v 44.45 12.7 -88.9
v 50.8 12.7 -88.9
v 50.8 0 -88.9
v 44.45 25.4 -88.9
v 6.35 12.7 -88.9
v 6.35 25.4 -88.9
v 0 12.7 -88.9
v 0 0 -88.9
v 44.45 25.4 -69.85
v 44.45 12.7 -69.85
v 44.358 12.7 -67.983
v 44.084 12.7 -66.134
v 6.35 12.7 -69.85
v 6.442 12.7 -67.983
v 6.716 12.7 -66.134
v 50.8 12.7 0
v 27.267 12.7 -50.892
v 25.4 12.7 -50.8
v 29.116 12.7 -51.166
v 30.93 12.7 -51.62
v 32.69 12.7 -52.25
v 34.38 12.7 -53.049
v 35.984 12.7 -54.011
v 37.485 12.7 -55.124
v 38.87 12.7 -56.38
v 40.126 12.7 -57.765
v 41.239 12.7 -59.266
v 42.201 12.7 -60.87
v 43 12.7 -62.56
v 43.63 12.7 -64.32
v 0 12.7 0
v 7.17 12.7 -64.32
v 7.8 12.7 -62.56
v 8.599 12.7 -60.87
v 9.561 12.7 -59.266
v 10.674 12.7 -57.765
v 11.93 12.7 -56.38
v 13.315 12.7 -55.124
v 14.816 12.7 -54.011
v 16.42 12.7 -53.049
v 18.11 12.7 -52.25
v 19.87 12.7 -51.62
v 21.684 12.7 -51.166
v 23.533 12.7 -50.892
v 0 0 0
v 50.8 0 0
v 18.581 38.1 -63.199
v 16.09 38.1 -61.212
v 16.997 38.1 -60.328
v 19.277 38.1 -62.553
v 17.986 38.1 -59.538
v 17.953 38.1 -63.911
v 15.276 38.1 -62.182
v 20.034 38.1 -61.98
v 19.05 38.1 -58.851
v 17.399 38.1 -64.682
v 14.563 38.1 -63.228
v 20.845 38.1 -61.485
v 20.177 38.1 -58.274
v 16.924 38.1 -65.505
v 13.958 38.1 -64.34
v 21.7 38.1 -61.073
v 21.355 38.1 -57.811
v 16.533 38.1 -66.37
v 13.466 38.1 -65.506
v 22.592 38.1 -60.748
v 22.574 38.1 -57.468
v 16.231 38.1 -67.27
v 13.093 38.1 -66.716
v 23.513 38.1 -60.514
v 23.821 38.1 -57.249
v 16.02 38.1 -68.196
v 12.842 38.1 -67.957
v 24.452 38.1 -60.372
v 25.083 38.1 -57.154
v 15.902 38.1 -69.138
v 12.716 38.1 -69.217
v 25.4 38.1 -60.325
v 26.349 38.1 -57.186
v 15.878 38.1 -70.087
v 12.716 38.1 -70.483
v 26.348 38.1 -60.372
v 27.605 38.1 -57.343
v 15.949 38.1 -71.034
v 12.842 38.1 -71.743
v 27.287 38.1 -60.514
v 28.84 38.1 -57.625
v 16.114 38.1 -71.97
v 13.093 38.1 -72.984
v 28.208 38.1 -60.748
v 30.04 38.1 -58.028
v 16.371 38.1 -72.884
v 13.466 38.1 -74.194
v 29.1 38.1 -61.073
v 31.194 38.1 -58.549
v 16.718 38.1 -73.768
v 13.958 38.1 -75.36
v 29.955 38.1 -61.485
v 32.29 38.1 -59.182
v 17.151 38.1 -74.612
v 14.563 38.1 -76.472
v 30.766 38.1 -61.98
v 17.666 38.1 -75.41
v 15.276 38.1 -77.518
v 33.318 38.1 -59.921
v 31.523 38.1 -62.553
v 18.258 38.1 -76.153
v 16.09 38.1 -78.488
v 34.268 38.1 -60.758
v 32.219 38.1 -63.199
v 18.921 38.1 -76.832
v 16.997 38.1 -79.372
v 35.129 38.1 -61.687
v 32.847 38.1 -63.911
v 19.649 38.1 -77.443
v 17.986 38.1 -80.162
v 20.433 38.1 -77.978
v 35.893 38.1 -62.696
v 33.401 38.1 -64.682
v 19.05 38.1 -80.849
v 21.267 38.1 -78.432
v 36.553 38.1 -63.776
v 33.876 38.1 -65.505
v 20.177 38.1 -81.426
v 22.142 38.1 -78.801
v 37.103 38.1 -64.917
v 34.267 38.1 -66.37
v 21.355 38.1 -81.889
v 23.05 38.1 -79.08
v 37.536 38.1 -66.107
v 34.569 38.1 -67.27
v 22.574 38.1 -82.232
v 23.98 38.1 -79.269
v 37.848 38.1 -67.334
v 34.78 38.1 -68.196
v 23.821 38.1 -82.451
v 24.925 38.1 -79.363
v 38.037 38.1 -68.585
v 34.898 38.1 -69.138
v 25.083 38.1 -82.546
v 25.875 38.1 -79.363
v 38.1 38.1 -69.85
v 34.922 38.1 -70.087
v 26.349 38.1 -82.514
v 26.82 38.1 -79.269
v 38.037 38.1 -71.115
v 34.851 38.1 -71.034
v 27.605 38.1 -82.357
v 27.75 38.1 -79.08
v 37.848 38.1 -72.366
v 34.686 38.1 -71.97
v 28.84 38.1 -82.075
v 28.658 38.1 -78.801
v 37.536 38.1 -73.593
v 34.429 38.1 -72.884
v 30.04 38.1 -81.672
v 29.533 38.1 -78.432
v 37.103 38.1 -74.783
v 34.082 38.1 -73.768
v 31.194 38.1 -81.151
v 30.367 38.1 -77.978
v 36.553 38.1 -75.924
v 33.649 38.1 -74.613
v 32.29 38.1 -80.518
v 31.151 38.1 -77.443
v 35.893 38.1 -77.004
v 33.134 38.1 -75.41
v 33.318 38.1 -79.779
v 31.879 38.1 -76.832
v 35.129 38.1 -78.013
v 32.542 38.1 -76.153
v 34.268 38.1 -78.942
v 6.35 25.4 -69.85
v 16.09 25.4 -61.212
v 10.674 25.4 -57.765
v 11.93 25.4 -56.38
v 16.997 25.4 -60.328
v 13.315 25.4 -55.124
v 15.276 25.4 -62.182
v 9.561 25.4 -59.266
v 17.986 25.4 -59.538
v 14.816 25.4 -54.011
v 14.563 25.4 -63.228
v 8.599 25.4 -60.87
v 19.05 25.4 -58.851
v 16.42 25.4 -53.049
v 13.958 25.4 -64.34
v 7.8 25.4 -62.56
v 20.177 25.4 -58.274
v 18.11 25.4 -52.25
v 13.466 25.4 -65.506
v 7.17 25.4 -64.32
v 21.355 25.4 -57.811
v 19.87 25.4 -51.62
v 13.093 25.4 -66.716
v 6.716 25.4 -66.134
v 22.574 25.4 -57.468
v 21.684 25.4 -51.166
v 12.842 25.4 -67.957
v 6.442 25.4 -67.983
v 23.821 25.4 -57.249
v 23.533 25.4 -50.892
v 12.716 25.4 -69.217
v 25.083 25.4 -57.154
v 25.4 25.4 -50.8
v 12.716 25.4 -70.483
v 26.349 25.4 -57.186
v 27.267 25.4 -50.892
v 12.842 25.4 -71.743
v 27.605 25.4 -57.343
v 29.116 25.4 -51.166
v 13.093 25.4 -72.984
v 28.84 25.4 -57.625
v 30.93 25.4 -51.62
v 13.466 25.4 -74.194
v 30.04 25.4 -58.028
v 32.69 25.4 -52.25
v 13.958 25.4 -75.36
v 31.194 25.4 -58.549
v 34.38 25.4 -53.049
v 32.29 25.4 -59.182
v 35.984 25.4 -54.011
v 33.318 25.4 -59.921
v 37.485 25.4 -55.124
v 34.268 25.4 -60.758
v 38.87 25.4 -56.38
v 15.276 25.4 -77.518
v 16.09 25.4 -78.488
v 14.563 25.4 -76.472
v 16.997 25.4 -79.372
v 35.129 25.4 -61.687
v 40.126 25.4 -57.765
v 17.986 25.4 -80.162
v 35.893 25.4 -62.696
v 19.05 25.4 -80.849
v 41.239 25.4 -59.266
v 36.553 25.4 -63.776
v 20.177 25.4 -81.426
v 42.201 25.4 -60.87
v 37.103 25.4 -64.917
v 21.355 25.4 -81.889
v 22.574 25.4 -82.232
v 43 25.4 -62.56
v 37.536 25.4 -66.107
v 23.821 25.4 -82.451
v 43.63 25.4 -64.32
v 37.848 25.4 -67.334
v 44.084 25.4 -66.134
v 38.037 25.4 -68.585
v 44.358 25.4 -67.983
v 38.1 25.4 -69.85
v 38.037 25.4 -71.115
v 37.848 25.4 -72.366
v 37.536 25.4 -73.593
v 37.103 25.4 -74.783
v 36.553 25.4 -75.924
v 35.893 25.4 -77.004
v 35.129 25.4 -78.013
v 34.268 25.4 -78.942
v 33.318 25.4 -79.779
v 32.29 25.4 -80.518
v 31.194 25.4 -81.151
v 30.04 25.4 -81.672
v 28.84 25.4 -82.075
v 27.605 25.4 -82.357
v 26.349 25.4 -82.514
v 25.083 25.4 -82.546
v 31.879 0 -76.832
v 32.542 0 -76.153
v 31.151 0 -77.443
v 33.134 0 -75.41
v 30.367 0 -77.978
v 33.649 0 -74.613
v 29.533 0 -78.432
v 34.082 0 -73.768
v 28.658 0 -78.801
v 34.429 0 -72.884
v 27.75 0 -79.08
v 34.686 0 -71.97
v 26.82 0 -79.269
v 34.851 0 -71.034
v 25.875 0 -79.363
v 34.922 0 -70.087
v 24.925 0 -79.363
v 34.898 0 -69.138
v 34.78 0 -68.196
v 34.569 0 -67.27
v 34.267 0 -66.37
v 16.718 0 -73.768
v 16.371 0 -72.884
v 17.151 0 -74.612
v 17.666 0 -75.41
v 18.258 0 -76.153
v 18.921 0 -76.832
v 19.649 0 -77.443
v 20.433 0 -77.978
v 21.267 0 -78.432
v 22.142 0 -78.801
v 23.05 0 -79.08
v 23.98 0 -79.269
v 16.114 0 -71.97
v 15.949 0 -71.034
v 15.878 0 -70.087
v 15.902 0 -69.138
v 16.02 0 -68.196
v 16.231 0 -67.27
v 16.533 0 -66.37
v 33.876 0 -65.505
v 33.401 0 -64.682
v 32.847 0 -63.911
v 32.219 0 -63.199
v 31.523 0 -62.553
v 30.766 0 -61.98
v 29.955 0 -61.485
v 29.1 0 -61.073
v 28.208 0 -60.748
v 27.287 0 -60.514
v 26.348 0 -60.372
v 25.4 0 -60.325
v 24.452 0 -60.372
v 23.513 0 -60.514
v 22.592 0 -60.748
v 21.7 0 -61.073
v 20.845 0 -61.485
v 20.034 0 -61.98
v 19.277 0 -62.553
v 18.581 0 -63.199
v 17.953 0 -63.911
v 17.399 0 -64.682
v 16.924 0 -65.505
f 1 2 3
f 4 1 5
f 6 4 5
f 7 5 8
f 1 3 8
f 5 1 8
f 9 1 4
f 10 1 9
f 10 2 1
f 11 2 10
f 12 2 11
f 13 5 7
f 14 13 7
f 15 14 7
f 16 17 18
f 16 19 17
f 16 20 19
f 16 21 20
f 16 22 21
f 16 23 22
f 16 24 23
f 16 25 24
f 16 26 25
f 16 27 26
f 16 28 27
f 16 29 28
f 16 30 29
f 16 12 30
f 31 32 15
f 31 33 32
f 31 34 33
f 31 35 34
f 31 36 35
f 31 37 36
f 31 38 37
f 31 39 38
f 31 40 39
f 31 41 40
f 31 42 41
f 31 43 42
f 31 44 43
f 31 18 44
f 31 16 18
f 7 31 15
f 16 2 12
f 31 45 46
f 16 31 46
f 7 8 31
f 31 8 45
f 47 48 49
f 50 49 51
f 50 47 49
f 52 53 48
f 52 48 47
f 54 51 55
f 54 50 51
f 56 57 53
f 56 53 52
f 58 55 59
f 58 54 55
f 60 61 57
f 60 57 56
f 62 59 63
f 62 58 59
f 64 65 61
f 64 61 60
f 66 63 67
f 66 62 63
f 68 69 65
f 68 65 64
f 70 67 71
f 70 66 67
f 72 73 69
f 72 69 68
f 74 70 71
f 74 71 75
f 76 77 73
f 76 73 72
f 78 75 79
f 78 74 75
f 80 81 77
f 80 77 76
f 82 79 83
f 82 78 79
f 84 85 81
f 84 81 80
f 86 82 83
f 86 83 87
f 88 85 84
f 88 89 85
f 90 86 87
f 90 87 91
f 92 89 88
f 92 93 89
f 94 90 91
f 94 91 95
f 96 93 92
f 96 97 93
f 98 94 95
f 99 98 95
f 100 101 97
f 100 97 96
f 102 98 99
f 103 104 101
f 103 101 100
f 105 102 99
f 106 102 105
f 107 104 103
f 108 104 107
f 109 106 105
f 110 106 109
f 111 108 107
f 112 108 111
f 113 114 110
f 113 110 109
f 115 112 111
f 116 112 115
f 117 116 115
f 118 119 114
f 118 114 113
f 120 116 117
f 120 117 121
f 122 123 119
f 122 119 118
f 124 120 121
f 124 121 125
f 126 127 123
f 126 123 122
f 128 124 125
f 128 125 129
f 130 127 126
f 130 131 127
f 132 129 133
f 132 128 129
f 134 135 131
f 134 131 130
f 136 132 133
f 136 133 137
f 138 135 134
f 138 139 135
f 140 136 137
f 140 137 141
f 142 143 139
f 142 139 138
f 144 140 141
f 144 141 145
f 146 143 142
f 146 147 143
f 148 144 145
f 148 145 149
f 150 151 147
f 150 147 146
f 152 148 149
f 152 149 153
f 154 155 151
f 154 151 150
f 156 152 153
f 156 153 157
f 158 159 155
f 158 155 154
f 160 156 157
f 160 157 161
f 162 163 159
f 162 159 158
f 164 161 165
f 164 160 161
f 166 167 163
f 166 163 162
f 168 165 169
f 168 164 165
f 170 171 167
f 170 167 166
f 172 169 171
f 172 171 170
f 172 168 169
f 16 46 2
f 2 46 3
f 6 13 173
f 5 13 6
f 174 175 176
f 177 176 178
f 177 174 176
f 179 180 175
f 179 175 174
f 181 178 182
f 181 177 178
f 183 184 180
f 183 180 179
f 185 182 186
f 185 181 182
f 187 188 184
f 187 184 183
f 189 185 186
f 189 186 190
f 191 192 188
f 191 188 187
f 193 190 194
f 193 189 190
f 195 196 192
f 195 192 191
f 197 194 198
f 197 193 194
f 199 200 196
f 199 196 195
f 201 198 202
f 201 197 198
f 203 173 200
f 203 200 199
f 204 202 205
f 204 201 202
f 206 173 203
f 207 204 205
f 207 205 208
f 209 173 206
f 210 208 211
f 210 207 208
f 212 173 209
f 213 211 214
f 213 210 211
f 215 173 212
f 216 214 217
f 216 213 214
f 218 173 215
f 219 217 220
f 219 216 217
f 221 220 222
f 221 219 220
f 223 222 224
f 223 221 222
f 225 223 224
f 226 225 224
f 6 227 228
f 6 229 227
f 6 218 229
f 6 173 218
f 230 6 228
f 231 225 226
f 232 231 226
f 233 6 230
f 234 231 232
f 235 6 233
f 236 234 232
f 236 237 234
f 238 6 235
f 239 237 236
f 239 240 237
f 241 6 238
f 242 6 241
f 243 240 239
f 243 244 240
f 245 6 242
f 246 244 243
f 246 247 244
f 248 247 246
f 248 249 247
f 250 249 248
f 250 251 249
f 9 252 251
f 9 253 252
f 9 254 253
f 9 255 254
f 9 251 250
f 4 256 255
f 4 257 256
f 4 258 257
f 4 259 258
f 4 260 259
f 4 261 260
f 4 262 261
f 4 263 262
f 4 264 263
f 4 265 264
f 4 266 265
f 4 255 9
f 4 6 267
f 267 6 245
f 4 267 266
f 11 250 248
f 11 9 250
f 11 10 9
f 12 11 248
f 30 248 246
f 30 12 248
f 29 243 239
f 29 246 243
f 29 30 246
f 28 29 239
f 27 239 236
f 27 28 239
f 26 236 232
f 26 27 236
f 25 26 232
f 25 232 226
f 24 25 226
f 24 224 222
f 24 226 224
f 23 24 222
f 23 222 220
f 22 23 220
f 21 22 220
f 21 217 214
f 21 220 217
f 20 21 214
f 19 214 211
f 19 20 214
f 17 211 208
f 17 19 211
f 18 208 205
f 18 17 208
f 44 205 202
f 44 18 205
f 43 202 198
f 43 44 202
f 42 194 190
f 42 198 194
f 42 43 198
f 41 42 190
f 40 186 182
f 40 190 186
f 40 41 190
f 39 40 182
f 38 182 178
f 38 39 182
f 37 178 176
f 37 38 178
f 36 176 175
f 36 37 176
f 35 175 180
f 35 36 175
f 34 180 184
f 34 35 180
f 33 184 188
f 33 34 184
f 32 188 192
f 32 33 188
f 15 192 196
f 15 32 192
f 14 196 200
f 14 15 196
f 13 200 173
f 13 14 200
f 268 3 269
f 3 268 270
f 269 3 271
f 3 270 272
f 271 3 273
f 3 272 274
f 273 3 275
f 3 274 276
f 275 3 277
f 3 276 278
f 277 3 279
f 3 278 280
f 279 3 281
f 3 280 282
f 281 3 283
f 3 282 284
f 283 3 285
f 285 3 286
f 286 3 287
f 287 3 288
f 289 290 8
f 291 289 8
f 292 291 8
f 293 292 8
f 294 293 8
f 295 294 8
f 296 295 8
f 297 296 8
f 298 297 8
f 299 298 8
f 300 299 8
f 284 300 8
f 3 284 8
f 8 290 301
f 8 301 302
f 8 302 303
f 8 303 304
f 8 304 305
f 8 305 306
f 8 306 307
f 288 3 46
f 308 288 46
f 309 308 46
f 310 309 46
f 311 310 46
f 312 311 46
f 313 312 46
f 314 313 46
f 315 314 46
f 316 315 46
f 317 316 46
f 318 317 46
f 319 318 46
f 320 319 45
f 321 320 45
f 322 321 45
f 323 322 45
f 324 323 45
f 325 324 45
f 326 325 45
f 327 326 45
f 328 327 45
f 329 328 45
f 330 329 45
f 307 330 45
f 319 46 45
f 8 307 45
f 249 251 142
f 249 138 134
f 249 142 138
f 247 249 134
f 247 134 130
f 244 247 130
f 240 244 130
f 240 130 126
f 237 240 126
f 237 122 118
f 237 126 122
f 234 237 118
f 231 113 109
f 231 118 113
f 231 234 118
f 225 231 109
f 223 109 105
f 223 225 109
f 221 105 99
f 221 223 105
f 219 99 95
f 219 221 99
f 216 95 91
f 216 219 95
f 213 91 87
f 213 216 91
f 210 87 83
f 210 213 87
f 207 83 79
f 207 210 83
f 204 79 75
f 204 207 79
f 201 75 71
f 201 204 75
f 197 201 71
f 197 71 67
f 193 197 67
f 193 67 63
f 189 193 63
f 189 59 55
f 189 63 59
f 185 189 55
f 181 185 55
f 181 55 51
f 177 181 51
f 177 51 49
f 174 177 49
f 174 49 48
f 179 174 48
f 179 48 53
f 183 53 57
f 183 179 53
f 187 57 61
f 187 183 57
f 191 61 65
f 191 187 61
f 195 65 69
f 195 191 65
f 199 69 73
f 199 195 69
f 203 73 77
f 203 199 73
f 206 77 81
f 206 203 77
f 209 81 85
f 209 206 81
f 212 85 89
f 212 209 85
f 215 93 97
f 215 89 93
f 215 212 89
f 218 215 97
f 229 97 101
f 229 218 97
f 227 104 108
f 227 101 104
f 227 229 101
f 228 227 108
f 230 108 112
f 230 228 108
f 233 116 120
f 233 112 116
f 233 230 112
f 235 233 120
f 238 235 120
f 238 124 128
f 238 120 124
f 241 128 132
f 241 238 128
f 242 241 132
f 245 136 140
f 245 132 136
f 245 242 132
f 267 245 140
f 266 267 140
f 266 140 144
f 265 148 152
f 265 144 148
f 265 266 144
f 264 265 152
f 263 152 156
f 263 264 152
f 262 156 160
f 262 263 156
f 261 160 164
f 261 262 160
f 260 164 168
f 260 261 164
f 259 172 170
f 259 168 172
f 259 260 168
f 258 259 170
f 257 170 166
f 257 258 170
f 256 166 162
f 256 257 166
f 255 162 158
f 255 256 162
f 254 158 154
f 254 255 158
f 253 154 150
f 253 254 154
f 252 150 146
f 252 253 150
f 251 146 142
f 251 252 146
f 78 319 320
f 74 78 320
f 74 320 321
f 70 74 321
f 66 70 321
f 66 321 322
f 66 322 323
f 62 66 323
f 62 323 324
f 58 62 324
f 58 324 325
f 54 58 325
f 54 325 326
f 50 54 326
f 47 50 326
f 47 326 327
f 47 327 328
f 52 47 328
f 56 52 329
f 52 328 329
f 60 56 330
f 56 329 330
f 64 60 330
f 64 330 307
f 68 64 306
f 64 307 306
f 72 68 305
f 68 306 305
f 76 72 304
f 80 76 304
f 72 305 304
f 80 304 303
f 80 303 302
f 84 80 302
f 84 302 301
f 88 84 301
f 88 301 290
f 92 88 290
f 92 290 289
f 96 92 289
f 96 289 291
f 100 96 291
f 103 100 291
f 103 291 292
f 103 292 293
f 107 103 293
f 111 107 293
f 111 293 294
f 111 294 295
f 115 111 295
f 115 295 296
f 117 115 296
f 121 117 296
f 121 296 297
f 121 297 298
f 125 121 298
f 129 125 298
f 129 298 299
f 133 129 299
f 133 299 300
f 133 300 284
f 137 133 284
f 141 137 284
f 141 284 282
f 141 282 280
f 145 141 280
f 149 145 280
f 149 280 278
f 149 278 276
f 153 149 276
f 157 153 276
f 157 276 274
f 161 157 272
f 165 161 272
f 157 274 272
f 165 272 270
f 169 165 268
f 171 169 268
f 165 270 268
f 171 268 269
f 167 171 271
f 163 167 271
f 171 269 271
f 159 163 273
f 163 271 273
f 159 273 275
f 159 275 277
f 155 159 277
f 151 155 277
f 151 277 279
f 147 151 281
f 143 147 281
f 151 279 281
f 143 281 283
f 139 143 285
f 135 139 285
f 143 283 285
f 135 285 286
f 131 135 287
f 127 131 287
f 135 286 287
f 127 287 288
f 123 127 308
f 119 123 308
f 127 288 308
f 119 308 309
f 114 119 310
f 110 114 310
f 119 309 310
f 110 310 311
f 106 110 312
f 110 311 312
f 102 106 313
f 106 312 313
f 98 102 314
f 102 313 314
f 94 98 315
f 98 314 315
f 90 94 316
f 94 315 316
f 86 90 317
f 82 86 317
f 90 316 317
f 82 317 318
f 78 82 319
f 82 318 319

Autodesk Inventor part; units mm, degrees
ref_plane "YZ Plane" through (0, 0, 0) normal (1, 0, 0) x (0, 1, 0)
ref_plane "XZ Plane" through (0, 0, 0) normal (0, 1, 0) x (-1, 0, 0)
ref_plane "XY Plane" through (0, 0, 0) normal (0, 0, 1) x (1, 0, 0)
sketch "Sketch1" plane through (0, 0, 0) normal (0, 1, 0) x (-1, 0, 0)
  line L0 (0, 0) -> (-50.8, 0)
  line L1 (-50.8, 0) -> (-50.8, -88.9)
  line L2 (-50.8, -88.9) -> (0, -88.9)
  line L3 (0, -88.9) -> (0, 0)
  dimension "d0" = 50.8
  dimension "d1" = 88.9
extrude "Extrusion1" add sketch "Sketch1" along normal blind 12.7
sketch "Sketch2" plane through (0, 12.7, 0) normal (0, 1, 0) x (1, 0, 0)
  line L0 (50.8, 0) -> (50.8, 88.9) projected
  line L1 (50.8, 88.9) -> (0, 88.9) projected
  line L2 (0, 88.9) -> (0, 0) projected
  line L3 (6.35, 88.9) -> (44.45, 88.9)
  line L4 (44.45, 88.9) -> (44.45, 69.85)
  line L5 (44.45, 69.85) -> (6.35, 69.85)
  line L6 (6.35, 69.85) -> (6.35, 88.9)
  line L7 (6.35, 79.375) -> (0, 79.375) construction
  line L8 (44.45, 79.375) -> (50.8, 79.375) construction
  circle A0 centre (25.4, 69.85) radius 19.05
  dimension "d4" = 19.05
  dimension "d5" = 6.35
extrude "Extrusion2" add sketch "Sketch2" along normal blind 12.7
sketch "Sketch3" plane through (0, 25.4, 0) normal (0, 1, 0) x (1, 0, 0)
  arc A0 (6.35, 69.85) -> (44.45, 69.85) centre (25.4, 69.85) ccw projected
  circle A1 centre (25.4, 69.85) radius 12.7
  point P0 (0, 0)
  dimension "d8" = 25.4
extrude "Extrusion3" add sketch "Sketch3" along normal blind 12.7
sketch "Sketch6" plane through (0, 12.7, 0) normal (0, 1, 0) x (1, 0, 0)
  line L0 (44.45, 88.9) -> (44.45, 69.85) projected
  arc A0 (6.35, 69.85) -> (44.45, 69.85) centre (25.4, 69.85) ccw projected
  line L1 (6.35, 69.85) -> (6.35, 88.9) projected
  line L2 (6.35, 88.9) -> (0, 88.9) projected
  line L3 (0, 88.9) -> (0, 0) projected
  line L4 (0, 0) -> (50.8, 0) projected
  line L5 (50.8, 0) -> (50.8, 88.9) projected
  line L6 (50.8, 88.9) -> (44.45, 88.9) projected
  line L7 (44.45, 88.9) -> (44.45, 6.35) construction
  line L8 (44.45, 6.35) -> (6.35, 6.35) construction
  line L9 (6.35, 6.35) -> (6.35, 88.9) construction
  line L10 (6.35, 38.1) -> (44.45, 38.1) construction
  dimension "d35" = 6.35
  dimension "d36" = 31.75
hole "Hole3" at (25.4, 38.1, -69.85) direction (0, -1, 0) diameter 19.05 end through all
properties part number "Holes"
